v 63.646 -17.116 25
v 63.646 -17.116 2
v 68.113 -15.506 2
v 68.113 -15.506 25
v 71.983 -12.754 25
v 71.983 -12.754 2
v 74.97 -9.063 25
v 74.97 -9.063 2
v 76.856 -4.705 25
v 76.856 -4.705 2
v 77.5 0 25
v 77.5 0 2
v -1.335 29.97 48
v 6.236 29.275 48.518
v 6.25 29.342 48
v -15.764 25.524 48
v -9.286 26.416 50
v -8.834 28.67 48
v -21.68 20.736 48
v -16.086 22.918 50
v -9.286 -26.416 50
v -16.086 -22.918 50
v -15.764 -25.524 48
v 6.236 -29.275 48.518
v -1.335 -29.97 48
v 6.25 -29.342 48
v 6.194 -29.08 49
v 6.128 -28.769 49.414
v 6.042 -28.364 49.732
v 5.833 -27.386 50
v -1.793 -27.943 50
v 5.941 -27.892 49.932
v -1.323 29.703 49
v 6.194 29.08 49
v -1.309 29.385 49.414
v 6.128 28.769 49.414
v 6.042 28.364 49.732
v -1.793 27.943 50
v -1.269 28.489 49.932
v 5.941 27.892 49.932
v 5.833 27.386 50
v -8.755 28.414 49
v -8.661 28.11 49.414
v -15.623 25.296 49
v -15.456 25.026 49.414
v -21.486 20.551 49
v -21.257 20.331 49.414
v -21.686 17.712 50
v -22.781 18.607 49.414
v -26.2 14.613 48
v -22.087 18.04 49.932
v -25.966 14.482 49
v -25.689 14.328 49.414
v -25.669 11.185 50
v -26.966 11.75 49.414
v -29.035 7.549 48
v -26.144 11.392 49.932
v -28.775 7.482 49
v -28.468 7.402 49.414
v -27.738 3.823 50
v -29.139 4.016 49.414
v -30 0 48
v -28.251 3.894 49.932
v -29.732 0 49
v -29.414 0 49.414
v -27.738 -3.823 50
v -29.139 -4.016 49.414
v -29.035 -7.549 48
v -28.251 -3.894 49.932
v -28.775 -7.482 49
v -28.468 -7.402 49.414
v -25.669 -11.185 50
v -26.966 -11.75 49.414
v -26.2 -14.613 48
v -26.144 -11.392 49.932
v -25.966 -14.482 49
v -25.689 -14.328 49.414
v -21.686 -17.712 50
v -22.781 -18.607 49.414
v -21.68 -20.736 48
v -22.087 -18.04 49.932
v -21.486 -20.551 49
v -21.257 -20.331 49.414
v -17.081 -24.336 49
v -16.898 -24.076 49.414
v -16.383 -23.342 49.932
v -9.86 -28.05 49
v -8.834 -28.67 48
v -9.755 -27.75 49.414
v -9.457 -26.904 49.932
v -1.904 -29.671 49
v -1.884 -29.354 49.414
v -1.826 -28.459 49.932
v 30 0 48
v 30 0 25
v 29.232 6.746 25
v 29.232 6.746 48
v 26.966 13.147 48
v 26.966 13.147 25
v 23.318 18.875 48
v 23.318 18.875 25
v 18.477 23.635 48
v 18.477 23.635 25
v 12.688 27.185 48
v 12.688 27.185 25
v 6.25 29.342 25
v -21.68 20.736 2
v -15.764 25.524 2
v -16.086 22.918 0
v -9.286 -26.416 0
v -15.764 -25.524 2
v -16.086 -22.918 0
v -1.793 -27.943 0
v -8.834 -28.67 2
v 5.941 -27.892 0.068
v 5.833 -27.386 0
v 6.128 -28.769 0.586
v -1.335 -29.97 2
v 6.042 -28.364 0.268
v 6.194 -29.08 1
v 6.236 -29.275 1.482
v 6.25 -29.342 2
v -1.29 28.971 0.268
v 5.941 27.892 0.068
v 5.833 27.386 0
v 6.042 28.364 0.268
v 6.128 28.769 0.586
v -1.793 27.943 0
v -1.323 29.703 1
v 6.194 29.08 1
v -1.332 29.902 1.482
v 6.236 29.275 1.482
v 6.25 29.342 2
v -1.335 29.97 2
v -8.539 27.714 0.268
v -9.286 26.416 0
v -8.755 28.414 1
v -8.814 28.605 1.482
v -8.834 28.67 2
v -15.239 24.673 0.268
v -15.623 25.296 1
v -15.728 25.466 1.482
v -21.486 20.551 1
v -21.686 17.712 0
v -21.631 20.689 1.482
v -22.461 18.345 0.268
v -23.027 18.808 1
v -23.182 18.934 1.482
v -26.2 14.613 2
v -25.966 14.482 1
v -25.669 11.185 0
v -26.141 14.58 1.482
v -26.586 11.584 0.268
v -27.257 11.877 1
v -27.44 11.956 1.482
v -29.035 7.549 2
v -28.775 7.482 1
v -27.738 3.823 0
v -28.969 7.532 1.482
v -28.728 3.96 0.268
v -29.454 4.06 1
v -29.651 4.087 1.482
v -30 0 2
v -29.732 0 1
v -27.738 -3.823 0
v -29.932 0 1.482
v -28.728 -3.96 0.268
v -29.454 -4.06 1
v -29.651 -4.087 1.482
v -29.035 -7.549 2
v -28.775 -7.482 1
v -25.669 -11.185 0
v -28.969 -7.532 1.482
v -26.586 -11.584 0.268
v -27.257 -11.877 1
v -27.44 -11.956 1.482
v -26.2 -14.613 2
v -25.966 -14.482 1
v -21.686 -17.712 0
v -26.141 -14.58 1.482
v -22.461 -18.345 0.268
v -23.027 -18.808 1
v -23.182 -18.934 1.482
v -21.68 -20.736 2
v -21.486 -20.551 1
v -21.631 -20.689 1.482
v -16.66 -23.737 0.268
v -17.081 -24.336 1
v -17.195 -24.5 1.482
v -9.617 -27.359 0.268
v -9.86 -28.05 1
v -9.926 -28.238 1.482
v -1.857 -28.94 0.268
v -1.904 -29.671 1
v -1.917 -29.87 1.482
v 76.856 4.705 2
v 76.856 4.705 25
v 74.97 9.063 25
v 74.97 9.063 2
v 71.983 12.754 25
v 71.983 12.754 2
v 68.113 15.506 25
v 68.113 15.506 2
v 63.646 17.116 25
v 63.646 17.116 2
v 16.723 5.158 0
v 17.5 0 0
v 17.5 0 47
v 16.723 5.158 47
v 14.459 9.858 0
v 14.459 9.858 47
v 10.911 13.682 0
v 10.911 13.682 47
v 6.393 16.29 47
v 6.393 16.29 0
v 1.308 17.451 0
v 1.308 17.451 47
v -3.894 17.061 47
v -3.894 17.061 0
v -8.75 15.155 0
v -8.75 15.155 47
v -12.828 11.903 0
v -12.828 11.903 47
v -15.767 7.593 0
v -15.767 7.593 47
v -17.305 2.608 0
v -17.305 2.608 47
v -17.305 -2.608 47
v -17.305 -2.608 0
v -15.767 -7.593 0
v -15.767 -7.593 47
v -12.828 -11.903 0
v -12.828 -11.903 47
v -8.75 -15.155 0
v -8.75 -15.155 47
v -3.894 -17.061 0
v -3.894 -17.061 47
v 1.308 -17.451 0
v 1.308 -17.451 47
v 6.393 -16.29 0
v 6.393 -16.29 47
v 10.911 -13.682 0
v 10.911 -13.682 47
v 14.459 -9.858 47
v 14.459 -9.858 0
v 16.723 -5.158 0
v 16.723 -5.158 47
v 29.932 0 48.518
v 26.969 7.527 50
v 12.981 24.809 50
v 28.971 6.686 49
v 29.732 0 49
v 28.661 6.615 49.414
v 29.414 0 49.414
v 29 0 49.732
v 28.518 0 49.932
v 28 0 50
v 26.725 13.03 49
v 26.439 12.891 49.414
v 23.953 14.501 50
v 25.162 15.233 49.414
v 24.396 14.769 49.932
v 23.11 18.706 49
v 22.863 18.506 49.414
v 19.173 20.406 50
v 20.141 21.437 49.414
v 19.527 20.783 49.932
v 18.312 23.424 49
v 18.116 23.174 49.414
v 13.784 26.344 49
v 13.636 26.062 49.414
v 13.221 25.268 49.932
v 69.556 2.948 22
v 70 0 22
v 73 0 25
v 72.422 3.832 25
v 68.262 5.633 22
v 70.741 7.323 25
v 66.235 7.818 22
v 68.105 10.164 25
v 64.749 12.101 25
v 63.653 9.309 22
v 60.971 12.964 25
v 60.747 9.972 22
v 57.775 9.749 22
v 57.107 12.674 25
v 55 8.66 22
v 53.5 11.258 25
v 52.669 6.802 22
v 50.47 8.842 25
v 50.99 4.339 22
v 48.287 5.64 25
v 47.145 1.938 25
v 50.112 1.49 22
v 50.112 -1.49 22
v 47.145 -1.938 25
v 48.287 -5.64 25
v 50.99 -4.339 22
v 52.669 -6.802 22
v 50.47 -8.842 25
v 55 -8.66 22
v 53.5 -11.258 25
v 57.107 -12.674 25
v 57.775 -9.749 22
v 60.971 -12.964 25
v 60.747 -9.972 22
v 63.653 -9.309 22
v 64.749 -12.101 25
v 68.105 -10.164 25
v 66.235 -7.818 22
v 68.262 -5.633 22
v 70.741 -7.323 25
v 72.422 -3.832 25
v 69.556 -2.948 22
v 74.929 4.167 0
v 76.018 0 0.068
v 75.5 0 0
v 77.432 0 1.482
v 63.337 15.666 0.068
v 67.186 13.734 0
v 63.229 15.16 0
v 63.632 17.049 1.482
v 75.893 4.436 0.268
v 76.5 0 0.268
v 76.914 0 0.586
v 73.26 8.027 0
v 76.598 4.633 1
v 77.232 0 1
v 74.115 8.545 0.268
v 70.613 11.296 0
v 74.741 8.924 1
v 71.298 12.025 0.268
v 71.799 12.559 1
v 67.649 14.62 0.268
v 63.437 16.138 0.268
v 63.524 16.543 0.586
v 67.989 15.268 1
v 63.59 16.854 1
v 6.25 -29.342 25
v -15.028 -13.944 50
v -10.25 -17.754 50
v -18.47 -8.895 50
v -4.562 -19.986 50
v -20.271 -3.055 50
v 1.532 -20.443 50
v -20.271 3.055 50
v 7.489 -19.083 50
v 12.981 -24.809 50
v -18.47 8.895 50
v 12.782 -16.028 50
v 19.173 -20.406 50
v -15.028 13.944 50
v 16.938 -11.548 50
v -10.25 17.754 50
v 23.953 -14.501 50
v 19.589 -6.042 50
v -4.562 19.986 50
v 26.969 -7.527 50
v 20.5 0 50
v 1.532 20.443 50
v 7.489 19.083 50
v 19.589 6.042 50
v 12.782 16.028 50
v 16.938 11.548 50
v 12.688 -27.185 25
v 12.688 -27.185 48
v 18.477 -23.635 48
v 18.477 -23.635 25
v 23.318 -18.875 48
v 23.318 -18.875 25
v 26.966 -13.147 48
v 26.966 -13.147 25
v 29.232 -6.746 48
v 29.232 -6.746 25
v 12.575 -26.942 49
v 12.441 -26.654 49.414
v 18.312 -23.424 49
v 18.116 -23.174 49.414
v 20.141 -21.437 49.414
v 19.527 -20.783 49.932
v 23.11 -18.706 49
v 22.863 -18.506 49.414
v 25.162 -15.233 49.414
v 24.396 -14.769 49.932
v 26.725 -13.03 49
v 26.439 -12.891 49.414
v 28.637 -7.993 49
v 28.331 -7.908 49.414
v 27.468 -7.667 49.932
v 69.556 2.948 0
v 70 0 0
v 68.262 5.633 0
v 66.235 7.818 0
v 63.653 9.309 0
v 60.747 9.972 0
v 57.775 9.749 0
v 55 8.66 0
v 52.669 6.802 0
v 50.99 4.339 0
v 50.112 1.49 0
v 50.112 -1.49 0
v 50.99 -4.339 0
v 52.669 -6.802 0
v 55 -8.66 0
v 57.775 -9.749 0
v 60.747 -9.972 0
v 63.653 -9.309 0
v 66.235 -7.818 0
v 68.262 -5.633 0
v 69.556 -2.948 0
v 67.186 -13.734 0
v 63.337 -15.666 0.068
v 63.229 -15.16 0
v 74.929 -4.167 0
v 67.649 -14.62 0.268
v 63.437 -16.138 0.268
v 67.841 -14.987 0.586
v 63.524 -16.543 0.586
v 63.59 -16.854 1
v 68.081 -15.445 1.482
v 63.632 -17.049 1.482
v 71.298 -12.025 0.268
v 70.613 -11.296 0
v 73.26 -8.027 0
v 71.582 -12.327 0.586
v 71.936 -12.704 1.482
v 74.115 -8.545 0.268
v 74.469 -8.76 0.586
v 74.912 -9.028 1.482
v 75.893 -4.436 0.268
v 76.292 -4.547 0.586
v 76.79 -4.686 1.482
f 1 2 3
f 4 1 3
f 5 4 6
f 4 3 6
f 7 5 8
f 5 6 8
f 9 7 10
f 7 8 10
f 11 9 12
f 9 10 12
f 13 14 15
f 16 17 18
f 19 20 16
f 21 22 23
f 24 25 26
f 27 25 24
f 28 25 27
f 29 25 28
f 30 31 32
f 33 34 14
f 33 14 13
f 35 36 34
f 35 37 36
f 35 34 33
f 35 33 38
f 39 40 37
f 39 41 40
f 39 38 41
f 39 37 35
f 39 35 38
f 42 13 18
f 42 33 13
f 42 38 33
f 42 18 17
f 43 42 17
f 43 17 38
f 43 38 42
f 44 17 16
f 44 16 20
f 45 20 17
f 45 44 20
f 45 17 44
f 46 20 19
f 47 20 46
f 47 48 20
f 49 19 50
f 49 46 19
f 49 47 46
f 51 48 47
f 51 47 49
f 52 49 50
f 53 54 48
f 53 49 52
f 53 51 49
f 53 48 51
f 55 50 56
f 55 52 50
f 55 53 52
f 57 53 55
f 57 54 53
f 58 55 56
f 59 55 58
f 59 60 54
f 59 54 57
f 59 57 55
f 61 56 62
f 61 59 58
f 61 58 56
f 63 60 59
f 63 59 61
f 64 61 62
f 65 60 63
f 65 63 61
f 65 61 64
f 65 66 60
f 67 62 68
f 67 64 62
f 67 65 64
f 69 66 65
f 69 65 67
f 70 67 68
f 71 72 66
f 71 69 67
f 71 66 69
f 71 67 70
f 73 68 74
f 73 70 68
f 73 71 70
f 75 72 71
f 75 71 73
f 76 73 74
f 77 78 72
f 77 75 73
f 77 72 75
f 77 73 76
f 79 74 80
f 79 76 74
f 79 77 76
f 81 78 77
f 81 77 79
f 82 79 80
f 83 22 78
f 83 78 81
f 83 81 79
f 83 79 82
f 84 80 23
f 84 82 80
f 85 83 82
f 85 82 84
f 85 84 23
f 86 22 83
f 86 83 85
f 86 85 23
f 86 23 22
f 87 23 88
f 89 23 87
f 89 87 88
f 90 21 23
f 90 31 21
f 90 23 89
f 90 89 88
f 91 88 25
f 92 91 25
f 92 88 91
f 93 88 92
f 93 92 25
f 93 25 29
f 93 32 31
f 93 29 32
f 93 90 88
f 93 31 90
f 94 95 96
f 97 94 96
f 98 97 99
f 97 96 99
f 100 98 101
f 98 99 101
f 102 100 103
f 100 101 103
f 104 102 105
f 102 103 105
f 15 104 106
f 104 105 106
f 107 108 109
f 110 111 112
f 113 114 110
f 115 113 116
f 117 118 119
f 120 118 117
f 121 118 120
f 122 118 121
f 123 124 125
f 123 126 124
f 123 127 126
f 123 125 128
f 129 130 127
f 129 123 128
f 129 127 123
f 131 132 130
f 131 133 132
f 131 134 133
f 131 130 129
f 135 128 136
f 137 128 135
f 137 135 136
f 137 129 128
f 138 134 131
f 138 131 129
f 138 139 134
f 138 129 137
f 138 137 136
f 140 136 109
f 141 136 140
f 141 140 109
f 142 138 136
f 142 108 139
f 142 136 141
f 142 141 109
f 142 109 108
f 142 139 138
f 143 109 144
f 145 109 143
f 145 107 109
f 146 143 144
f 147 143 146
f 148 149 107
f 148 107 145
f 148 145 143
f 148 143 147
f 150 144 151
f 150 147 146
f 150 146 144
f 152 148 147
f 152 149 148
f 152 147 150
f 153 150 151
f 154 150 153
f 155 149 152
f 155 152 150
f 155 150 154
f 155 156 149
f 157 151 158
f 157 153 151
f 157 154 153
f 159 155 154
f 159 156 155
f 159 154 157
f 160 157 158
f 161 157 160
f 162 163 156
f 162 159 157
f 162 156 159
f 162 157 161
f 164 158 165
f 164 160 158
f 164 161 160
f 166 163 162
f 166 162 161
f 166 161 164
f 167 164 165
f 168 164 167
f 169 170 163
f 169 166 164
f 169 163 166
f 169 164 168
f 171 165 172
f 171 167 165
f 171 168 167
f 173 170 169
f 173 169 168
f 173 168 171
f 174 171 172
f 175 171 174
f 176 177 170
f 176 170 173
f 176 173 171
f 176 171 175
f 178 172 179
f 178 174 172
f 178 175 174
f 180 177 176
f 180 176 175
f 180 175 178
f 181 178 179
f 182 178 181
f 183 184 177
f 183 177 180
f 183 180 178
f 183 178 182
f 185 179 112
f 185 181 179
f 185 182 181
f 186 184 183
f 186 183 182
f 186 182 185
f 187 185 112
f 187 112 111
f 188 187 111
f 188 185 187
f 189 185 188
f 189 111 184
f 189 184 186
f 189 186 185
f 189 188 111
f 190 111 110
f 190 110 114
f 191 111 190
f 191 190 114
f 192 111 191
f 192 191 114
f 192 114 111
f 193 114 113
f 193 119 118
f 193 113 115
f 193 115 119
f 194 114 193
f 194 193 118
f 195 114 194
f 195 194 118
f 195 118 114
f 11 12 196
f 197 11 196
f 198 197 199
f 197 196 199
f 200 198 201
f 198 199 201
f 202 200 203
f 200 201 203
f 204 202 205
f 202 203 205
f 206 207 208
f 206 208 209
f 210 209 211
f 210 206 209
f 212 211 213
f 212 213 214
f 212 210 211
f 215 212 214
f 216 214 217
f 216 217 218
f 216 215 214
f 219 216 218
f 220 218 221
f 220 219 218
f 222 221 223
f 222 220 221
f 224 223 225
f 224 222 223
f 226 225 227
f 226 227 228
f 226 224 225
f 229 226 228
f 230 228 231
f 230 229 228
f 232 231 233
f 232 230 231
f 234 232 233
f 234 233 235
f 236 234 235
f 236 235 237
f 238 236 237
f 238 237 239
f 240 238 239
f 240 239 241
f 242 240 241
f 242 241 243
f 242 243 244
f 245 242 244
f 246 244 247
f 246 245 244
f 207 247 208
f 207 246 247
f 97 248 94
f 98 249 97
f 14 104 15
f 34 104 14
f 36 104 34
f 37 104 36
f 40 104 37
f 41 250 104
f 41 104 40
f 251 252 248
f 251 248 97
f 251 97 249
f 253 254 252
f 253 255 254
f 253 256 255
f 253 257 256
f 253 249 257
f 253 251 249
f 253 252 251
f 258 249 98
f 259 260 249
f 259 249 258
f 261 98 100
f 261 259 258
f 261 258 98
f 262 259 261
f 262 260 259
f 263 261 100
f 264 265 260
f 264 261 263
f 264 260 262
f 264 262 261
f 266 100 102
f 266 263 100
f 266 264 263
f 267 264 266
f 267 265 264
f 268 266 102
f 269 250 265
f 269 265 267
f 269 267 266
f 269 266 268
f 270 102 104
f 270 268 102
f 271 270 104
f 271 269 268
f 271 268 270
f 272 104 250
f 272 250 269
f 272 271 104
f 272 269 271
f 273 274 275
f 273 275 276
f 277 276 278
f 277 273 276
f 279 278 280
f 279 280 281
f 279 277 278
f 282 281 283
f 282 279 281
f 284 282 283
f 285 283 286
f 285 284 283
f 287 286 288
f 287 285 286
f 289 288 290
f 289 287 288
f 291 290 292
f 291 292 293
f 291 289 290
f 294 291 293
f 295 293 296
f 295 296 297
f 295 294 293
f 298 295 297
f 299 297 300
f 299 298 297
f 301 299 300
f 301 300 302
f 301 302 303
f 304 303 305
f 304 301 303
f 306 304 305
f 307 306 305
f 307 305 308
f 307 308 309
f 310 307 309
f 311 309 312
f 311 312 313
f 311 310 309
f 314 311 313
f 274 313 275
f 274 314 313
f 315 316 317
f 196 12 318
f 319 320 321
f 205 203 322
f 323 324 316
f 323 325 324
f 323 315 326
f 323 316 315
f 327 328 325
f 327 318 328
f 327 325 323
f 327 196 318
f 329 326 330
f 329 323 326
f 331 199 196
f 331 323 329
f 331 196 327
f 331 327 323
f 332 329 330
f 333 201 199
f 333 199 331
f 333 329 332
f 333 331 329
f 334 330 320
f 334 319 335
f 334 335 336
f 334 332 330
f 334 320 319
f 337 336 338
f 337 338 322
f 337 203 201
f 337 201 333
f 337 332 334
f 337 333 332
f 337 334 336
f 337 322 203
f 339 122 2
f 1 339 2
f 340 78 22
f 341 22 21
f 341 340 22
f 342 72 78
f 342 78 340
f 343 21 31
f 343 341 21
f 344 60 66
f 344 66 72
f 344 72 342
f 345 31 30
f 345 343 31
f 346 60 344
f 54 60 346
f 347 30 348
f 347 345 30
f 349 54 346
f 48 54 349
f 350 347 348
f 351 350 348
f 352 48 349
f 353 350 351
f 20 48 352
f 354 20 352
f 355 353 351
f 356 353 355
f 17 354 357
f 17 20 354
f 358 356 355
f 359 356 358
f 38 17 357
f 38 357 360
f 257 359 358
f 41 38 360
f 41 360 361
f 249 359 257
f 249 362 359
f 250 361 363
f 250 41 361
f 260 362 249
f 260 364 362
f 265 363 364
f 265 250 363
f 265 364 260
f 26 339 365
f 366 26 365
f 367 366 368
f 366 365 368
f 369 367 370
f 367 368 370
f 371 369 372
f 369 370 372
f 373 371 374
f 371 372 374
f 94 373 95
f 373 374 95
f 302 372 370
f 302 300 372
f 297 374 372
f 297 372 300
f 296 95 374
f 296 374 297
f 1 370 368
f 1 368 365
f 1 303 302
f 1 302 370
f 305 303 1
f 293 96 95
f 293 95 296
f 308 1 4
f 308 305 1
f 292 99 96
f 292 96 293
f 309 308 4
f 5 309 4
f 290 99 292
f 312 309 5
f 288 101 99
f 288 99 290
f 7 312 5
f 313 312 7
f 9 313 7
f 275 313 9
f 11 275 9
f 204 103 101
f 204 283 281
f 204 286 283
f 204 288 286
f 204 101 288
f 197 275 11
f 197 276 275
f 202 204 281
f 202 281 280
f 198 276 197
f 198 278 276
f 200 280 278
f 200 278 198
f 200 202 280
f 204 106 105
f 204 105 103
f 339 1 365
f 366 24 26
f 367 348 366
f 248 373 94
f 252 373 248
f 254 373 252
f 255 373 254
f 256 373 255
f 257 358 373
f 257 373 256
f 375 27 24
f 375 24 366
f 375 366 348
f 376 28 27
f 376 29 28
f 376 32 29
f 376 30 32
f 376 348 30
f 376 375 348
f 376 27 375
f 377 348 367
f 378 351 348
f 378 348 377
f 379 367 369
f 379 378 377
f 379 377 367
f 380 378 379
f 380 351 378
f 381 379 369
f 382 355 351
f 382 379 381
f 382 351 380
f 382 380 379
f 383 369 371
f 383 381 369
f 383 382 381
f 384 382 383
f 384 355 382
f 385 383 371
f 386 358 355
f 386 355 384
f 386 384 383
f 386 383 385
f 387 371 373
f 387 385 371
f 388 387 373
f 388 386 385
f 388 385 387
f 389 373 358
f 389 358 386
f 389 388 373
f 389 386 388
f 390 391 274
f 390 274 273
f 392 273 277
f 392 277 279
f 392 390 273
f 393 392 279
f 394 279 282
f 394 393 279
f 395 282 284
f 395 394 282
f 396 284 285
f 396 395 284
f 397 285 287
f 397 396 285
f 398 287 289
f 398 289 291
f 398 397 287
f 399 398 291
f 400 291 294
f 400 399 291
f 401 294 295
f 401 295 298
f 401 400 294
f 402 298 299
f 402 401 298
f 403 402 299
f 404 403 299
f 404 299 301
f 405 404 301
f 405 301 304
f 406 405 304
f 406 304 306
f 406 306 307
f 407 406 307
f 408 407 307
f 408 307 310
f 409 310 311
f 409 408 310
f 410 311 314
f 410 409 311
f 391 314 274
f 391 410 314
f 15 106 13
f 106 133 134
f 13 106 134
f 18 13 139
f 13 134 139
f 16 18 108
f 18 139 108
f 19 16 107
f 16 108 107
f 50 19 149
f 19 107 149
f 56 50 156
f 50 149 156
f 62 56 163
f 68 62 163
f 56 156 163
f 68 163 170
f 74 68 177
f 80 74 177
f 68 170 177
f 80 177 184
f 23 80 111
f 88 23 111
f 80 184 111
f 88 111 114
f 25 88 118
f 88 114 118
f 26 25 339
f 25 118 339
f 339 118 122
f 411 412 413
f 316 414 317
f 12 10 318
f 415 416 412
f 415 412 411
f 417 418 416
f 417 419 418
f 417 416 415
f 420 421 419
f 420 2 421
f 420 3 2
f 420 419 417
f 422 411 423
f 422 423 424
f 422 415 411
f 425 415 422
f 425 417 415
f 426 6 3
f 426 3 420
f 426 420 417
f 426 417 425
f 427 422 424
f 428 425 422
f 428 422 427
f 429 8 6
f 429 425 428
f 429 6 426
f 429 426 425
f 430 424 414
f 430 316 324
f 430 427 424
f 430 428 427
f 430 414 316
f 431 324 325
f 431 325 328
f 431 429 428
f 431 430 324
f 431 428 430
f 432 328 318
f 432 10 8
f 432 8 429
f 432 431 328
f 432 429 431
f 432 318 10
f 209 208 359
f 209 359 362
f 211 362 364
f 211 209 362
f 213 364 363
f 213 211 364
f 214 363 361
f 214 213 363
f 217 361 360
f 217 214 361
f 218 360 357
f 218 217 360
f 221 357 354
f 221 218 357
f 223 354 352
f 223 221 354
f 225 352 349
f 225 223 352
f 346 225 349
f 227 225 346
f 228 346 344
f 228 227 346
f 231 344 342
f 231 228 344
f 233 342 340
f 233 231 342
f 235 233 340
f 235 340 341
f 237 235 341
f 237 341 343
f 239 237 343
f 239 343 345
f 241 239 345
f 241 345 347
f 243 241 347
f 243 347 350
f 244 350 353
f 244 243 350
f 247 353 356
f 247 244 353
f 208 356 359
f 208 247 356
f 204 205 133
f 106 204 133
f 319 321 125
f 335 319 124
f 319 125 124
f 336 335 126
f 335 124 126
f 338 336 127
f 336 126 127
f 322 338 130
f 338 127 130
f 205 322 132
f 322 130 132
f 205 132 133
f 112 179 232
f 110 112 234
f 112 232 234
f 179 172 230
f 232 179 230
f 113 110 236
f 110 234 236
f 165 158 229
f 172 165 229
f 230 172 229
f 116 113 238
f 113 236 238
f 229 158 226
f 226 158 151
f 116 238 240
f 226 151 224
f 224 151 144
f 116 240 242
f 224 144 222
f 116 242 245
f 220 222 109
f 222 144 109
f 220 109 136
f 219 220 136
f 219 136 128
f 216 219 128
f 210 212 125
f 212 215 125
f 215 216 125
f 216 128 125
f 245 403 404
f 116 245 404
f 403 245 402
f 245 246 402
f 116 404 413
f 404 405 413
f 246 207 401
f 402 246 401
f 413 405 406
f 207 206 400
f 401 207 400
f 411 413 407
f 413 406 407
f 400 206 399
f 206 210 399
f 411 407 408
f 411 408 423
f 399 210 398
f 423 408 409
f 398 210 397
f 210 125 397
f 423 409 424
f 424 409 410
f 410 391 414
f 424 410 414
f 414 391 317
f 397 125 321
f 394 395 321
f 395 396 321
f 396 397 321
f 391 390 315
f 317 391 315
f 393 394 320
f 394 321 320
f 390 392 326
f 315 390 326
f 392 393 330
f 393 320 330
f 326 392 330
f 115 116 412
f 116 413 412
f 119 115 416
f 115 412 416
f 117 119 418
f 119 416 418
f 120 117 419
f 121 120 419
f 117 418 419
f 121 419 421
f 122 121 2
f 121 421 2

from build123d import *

# Parameters (mm, degrees)
F0_R     = 17.5
F0_R_2   = 10
F1_DEPTH = 25
F2_DEPTH = 50
F3_R     = 2
F4_SIZE  = 3


with BuildPart() as f1:
    # F0 (on Top) → F1 (new body)
    with BuildSketch(Plane.XY):
        with BuildLine():
            ThreePointArc((6.25, -29.341736), (23.318448, -18.874586), (30, 0))
            ThreePointArc((30, 0), (23.318448, 18.874586), (6.25, 29.341736))
            ThreePointArc((6.25, 29.341736), (-30, 0), (6.25, -29.341736))
        make_face()
        Circle(F0_R, mode=Mode.SUBTRACT)
        with BuildLine():
            ThreePointArc((6.25, 29.341736), (23.318448, 18.874586), (30, 0))
            ThreePointArc((30, 0), (23.318448, -18.874586), (6.25, -29.341736))
            Line((6.25, -29.341736), (63.645833, -17.116013))
            ThreePointArc((63.645833, -17.116013), (42.5, 0), (63.645833, 17.116013))
            Line((63.645833, 17.116013), (6.25, 29.341736))
        make_face()
        with BuildLine():
            ThreePointArc((77.5, 0), (73.602428, 11.010175), (63.645833, 17.116013))
            ThreePointArc((63.645833, 17.116013), (42.5, 0), (63.645833, -17.116013))
            ThreePointArc((63.645833, -17.116013), (73.602428, -11.010175), (77.5, 0))
        make_face()
        with Locations((60, 0)):
            Circle(F0_R_2, mode=Mode.SUBTRACT)
    extrude(amount=F1_DEPTH)

    # F0 (on Top) → F2 (join)
    with BuildSketch(Plane.XY):
        with BuildLine():
            ThreePointArc((6.25, -29.341736), (23.318448, -18.874586), (30, 0))
            ThreePointArc((30, 0), (23.318448, 18.874586), (6.25, 29.341736))
            ThreePointArc((6.25, 29.341736), (-30, 0), (6.25, -29.341736))
        make_face()
        Circle(F0_R, mode=Mode.SUBTRACT)
    extrude(amount=F2_DEPTH)

    # F3
    f3_edges = [f1.edges().sort_by_distance(p)[0] for p in [
        (-6.25, 29.341736, 50),
        (34.947917, -23.228875, 0),
        (34.947917, 23.228875, 0),
    ]]
    fillet(f3_edges, radius=F3_R)

    # F4
    f4_edges = [f1.edges().sort_by_distance(p)[0] for p in [
        (-17.5, 0, 50),
        (50, 0, 25),
    ]]
    chamfer(f4_edges, length=F4_SIZE)


solid = f1.part
